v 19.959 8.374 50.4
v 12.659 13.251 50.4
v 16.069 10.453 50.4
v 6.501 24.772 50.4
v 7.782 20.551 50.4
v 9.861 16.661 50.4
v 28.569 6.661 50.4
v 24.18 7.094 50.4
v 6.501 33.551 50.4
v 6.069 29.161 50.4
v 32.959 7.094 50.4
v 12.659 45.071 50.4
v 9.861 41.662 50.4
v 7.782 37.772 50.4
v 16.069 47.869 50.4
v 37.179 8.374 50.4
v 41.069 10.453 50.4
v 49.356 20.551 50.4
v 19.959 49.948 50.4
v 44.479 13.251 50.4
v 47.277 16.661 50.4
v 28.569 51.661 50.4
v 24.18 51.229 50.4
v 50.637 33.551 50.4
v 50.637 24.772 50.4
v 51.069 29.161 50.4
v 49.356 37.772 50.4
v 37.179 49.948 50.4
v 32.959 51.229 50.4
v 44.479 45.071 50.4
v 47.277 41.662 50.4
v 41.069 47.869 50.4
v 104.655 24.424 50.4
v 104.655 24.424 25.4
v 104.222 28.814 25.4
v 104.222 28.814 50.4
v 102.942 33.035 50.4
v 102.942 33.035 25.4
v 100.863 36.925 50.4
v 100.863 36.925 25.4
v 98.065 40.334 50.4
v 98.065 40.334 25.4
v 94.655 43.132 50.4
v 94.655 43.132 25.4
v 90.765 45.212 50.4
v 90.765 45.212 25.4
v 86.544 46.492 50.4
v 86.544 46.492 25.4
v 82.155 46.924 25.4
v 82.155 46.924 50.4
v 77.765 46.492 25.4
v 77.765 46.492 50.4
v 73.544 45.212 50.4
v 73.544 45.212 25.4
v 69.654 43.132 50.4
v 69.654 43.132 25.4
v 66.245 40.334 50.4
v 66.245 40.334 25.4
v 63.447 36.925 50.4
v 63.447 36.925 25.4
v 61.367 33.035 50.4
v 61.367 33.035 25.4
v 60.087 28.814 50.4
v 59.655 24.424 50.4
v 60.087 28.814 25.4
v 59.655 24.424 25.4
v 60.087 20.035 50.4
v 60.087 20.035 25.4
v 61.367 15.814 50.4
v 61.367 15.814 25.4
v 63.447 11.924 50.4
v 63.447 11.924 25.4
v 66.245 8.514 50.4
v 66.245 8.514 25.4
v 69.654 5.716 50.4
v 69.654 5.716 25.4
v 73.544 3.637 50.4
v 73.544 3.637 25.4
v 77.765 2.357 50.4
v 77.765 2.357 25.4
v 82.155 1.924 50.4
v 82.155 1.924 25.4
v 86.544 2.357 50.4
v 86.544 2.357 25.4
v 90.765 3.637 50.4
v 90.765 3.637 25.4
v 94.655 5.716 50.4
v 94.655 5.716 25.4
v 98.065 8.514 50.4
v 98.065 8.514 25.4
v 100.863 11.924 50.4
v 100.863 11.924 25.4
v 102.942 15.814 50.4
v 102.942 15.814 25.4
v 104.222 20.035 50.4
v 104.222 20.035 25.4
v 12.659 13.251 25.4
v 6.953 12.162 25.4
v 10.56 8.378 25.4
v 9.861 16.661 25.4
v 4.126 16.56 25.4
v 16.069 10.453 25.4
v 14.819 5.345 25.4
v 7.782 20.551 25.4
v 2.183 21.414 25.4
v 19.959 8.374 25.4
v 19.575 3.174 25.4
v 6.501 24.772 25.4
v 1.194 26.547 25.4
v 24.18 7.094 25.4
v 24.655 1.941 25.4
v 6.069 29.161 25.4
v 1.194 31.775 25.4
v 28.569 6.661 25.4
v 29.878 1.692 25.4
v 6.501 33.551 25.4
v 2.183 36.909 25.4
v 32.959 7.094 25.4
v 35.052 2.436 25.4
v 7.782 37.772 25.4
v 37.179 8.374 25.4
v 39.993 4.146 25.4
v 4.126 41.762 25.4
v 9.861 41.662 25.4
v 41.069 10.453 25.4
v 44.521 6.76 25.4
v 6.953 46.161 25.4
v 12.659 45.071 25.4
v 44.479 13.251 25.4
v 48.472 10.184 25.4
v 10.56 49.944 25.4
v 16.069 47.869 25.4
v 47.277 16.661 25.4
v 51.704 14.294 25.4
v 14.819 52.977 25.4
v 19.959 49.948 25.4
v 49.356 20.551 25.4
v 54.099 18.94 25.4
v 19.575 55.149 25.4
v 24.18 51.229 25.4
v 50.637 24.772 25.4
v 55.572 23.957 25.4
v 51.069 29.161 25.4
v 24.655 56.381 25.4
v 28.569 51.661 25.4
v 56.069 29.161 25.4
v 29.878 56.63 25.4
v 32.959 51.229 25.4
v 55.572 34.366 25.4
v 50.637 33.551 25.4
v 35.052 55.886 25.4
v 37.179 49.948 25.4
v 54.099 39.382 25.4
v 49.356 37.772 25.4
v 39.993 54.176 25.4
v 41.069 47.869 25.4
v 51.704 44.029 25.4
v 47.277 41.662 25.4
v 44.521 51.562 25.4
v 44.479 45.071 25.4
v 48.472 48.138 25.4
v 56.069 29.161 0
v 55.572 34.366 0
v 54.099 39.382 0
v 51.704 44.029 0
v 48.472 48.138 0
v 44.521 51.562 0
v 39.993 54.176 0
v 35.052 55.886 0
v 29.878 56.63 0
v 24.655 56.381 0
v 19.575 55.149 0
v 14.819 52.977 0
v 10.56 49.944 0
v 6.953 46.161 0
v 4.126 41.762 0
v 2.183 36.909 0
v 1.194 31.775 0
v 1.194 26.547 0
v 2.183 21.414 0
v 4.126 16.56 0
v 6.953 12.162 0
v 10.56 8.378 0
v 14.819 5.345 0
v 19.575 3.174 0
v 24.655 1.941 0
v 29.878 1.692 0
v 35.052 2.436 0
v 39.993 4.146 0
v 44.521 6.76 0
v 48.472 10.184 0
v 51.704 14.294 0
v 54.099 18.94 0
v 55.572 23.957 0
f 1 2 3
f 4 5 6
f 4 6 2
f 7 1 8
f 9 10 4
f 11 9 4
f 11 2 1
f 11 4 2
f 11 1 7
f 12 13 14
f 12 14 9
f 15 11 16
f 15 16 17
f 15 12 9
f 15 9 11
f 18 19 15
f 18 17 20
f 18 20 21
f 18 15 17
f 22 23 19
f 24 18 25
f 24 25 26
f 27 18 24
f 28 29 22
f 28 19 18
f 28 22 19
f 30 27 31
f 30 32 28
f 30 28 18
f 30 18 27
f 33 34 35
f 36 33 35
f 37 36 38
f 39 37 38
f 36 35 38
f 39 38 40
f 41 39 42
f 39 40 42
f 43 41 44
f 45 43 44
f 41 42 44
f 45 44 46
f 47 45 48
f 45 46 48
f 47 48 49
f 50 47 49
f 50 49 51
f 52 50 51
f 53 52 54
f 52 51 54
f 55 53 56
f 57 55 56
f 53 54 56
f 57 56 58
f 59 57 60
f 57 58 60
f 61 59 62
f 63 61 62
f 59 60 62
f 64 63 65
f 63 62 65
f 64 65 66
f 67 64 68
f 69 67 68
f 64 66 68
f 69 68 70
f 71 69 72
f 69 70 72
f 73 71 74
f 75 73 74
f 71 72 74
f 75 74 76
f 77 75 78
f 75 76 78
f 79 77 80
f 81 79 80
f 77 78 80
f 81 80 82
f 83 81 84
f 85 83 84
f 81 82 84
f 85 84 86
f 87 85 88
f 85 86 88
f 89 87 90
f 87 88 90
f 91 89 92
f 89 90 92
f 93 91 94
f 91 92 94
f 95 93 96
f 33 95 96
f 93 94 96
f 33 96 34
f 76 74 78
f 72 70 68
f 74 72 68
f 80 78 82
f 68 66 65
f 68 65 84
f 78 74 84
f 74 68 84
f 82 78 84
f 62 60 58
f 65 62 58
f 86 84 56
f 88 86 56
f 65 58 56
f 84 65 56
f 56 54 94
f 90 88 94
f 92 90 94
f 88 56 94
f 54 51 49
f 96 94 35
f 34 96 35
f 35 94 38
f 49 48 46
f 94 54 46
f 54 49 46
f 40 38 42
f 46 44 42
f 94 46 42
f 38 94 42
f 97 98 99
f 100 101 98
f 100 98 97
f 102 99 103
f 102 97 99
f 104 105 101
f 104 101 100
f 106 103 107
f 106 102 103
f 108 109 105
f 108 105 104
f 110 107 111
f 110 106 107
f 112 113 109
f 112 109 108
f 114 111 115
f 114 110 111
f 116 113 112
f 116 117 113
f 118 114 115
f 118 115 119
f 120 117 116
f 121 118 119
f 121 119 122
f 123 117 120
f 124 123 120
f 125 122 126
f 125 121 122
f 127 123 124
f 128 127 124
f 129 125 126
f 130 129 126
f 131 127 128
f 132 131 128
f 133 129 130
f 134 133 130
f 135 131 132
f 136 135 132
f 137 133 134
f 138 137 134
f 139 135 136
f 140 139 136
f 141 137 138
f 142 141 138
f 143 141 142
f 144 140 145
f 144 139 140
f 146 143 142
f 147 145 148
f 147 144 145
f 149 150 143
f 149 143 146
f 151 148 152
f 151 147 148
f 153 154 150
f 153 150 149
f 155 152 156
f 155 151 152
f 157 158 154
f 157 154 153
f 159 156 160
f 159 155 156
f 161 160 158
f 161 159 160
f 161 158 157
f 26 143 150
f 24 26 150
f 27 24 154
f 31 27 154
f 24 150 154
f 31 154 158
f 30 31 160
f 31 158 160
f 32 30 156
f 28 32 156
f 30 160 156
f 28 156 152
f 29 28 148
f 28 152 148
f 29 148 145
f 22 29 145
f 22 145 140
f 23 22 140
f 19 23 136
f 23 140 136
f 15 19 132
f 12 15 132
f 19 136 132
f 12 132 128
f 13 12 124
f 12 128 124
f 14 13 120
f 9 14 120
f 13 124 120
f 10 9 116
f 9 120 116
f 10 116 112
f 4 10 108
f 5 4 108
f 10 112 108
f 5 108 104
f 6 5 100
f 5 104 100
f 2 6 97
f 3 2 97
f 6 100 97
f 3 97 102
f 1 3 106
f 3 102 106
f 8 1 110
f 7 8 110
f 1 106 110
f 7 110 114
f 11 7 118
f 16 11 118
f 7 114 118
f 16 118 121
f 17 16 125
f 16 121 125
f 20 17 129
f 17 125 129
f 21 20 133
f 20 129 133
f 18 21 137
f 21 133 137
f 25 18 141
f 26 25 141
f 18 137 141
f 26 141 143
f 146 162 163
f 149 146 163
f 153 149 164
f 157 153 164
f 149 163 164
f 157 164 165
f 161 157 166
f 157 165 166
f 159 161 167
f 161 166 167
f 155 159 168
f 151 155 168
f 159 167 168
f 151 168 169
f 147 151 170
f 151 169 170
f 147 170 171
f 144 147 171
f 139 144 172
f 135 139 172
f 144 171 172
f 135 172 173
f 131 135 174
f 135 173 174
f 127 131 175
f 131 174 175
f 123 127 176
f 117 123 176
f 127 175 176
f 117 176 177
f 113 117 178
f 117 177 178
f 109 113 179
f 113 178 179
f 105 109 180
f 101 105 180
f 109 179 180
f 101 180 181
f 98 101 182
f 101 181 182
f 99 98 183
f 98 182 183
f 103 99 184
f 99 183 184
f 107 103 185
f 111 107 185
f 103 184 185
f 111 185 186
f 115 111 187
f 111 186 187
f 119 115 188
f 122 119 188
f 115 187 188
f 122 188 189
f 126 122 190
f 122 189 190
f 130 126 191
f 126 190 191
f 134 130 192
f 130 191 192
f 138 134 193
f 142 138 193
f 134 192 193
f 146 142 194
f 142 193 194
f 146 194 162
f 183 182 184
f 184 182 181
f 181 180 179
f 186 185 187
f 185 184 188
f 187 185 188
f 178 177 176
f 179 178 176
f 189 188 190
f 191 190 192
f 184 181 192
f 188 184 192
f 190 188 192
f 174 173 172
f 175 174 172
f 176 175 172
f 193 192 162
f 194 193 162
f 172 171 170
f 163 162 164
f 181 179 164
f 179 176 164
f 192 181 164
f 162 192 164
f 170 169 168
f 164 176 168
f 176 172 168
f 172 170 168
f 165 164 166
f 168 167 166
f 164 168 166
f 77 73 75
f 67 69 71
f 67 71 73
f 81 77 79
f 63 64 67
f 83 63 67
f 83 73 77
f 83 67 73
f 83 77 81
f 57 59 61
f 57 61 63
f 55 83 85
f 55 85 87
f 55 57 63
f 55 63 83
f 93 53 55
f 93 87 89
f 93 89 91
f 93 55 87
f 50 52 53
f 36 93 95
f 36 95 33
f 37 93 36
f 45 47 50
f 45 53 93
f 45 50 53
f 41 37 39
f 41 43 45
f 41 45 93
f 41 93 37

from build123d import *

# Parameters (mm, degrees)
F0_R     = 27.5
F1_DEPTH = 25.4
F2_R     = 22.5
F3_DEPTH = 25
F4_R     = 22.5
F5_DEPTH = 25


with BuildPart() as f1:
    # F0 (on Top) → F1 (new body)
    with BuildSketch(Plane.XY):
        with Locations((28.569078, 29.161185)):
            Circle(F0_R)
    extrude(amount=F1_DEPTH)

    # F2 (on face) → F3 (join)
    with BuildSketch(Plane.XY.offset(25.4)):
        with Locations((28.569078, 29.161185)):
            Circle(F2_R)
    extrude(amount=F3_DEPTH)


with BuildPart() as f5:
    # F4 (on face) → F5 (new body)
    with BuildSketch(Plane.XY.offset(25.4)):
        with Locations((82.154609, 24.424344)):
            Circle(F4_R)
    extrude(amount=F5_DEPTH)


solid = Compound([f1.part, f5.part])
